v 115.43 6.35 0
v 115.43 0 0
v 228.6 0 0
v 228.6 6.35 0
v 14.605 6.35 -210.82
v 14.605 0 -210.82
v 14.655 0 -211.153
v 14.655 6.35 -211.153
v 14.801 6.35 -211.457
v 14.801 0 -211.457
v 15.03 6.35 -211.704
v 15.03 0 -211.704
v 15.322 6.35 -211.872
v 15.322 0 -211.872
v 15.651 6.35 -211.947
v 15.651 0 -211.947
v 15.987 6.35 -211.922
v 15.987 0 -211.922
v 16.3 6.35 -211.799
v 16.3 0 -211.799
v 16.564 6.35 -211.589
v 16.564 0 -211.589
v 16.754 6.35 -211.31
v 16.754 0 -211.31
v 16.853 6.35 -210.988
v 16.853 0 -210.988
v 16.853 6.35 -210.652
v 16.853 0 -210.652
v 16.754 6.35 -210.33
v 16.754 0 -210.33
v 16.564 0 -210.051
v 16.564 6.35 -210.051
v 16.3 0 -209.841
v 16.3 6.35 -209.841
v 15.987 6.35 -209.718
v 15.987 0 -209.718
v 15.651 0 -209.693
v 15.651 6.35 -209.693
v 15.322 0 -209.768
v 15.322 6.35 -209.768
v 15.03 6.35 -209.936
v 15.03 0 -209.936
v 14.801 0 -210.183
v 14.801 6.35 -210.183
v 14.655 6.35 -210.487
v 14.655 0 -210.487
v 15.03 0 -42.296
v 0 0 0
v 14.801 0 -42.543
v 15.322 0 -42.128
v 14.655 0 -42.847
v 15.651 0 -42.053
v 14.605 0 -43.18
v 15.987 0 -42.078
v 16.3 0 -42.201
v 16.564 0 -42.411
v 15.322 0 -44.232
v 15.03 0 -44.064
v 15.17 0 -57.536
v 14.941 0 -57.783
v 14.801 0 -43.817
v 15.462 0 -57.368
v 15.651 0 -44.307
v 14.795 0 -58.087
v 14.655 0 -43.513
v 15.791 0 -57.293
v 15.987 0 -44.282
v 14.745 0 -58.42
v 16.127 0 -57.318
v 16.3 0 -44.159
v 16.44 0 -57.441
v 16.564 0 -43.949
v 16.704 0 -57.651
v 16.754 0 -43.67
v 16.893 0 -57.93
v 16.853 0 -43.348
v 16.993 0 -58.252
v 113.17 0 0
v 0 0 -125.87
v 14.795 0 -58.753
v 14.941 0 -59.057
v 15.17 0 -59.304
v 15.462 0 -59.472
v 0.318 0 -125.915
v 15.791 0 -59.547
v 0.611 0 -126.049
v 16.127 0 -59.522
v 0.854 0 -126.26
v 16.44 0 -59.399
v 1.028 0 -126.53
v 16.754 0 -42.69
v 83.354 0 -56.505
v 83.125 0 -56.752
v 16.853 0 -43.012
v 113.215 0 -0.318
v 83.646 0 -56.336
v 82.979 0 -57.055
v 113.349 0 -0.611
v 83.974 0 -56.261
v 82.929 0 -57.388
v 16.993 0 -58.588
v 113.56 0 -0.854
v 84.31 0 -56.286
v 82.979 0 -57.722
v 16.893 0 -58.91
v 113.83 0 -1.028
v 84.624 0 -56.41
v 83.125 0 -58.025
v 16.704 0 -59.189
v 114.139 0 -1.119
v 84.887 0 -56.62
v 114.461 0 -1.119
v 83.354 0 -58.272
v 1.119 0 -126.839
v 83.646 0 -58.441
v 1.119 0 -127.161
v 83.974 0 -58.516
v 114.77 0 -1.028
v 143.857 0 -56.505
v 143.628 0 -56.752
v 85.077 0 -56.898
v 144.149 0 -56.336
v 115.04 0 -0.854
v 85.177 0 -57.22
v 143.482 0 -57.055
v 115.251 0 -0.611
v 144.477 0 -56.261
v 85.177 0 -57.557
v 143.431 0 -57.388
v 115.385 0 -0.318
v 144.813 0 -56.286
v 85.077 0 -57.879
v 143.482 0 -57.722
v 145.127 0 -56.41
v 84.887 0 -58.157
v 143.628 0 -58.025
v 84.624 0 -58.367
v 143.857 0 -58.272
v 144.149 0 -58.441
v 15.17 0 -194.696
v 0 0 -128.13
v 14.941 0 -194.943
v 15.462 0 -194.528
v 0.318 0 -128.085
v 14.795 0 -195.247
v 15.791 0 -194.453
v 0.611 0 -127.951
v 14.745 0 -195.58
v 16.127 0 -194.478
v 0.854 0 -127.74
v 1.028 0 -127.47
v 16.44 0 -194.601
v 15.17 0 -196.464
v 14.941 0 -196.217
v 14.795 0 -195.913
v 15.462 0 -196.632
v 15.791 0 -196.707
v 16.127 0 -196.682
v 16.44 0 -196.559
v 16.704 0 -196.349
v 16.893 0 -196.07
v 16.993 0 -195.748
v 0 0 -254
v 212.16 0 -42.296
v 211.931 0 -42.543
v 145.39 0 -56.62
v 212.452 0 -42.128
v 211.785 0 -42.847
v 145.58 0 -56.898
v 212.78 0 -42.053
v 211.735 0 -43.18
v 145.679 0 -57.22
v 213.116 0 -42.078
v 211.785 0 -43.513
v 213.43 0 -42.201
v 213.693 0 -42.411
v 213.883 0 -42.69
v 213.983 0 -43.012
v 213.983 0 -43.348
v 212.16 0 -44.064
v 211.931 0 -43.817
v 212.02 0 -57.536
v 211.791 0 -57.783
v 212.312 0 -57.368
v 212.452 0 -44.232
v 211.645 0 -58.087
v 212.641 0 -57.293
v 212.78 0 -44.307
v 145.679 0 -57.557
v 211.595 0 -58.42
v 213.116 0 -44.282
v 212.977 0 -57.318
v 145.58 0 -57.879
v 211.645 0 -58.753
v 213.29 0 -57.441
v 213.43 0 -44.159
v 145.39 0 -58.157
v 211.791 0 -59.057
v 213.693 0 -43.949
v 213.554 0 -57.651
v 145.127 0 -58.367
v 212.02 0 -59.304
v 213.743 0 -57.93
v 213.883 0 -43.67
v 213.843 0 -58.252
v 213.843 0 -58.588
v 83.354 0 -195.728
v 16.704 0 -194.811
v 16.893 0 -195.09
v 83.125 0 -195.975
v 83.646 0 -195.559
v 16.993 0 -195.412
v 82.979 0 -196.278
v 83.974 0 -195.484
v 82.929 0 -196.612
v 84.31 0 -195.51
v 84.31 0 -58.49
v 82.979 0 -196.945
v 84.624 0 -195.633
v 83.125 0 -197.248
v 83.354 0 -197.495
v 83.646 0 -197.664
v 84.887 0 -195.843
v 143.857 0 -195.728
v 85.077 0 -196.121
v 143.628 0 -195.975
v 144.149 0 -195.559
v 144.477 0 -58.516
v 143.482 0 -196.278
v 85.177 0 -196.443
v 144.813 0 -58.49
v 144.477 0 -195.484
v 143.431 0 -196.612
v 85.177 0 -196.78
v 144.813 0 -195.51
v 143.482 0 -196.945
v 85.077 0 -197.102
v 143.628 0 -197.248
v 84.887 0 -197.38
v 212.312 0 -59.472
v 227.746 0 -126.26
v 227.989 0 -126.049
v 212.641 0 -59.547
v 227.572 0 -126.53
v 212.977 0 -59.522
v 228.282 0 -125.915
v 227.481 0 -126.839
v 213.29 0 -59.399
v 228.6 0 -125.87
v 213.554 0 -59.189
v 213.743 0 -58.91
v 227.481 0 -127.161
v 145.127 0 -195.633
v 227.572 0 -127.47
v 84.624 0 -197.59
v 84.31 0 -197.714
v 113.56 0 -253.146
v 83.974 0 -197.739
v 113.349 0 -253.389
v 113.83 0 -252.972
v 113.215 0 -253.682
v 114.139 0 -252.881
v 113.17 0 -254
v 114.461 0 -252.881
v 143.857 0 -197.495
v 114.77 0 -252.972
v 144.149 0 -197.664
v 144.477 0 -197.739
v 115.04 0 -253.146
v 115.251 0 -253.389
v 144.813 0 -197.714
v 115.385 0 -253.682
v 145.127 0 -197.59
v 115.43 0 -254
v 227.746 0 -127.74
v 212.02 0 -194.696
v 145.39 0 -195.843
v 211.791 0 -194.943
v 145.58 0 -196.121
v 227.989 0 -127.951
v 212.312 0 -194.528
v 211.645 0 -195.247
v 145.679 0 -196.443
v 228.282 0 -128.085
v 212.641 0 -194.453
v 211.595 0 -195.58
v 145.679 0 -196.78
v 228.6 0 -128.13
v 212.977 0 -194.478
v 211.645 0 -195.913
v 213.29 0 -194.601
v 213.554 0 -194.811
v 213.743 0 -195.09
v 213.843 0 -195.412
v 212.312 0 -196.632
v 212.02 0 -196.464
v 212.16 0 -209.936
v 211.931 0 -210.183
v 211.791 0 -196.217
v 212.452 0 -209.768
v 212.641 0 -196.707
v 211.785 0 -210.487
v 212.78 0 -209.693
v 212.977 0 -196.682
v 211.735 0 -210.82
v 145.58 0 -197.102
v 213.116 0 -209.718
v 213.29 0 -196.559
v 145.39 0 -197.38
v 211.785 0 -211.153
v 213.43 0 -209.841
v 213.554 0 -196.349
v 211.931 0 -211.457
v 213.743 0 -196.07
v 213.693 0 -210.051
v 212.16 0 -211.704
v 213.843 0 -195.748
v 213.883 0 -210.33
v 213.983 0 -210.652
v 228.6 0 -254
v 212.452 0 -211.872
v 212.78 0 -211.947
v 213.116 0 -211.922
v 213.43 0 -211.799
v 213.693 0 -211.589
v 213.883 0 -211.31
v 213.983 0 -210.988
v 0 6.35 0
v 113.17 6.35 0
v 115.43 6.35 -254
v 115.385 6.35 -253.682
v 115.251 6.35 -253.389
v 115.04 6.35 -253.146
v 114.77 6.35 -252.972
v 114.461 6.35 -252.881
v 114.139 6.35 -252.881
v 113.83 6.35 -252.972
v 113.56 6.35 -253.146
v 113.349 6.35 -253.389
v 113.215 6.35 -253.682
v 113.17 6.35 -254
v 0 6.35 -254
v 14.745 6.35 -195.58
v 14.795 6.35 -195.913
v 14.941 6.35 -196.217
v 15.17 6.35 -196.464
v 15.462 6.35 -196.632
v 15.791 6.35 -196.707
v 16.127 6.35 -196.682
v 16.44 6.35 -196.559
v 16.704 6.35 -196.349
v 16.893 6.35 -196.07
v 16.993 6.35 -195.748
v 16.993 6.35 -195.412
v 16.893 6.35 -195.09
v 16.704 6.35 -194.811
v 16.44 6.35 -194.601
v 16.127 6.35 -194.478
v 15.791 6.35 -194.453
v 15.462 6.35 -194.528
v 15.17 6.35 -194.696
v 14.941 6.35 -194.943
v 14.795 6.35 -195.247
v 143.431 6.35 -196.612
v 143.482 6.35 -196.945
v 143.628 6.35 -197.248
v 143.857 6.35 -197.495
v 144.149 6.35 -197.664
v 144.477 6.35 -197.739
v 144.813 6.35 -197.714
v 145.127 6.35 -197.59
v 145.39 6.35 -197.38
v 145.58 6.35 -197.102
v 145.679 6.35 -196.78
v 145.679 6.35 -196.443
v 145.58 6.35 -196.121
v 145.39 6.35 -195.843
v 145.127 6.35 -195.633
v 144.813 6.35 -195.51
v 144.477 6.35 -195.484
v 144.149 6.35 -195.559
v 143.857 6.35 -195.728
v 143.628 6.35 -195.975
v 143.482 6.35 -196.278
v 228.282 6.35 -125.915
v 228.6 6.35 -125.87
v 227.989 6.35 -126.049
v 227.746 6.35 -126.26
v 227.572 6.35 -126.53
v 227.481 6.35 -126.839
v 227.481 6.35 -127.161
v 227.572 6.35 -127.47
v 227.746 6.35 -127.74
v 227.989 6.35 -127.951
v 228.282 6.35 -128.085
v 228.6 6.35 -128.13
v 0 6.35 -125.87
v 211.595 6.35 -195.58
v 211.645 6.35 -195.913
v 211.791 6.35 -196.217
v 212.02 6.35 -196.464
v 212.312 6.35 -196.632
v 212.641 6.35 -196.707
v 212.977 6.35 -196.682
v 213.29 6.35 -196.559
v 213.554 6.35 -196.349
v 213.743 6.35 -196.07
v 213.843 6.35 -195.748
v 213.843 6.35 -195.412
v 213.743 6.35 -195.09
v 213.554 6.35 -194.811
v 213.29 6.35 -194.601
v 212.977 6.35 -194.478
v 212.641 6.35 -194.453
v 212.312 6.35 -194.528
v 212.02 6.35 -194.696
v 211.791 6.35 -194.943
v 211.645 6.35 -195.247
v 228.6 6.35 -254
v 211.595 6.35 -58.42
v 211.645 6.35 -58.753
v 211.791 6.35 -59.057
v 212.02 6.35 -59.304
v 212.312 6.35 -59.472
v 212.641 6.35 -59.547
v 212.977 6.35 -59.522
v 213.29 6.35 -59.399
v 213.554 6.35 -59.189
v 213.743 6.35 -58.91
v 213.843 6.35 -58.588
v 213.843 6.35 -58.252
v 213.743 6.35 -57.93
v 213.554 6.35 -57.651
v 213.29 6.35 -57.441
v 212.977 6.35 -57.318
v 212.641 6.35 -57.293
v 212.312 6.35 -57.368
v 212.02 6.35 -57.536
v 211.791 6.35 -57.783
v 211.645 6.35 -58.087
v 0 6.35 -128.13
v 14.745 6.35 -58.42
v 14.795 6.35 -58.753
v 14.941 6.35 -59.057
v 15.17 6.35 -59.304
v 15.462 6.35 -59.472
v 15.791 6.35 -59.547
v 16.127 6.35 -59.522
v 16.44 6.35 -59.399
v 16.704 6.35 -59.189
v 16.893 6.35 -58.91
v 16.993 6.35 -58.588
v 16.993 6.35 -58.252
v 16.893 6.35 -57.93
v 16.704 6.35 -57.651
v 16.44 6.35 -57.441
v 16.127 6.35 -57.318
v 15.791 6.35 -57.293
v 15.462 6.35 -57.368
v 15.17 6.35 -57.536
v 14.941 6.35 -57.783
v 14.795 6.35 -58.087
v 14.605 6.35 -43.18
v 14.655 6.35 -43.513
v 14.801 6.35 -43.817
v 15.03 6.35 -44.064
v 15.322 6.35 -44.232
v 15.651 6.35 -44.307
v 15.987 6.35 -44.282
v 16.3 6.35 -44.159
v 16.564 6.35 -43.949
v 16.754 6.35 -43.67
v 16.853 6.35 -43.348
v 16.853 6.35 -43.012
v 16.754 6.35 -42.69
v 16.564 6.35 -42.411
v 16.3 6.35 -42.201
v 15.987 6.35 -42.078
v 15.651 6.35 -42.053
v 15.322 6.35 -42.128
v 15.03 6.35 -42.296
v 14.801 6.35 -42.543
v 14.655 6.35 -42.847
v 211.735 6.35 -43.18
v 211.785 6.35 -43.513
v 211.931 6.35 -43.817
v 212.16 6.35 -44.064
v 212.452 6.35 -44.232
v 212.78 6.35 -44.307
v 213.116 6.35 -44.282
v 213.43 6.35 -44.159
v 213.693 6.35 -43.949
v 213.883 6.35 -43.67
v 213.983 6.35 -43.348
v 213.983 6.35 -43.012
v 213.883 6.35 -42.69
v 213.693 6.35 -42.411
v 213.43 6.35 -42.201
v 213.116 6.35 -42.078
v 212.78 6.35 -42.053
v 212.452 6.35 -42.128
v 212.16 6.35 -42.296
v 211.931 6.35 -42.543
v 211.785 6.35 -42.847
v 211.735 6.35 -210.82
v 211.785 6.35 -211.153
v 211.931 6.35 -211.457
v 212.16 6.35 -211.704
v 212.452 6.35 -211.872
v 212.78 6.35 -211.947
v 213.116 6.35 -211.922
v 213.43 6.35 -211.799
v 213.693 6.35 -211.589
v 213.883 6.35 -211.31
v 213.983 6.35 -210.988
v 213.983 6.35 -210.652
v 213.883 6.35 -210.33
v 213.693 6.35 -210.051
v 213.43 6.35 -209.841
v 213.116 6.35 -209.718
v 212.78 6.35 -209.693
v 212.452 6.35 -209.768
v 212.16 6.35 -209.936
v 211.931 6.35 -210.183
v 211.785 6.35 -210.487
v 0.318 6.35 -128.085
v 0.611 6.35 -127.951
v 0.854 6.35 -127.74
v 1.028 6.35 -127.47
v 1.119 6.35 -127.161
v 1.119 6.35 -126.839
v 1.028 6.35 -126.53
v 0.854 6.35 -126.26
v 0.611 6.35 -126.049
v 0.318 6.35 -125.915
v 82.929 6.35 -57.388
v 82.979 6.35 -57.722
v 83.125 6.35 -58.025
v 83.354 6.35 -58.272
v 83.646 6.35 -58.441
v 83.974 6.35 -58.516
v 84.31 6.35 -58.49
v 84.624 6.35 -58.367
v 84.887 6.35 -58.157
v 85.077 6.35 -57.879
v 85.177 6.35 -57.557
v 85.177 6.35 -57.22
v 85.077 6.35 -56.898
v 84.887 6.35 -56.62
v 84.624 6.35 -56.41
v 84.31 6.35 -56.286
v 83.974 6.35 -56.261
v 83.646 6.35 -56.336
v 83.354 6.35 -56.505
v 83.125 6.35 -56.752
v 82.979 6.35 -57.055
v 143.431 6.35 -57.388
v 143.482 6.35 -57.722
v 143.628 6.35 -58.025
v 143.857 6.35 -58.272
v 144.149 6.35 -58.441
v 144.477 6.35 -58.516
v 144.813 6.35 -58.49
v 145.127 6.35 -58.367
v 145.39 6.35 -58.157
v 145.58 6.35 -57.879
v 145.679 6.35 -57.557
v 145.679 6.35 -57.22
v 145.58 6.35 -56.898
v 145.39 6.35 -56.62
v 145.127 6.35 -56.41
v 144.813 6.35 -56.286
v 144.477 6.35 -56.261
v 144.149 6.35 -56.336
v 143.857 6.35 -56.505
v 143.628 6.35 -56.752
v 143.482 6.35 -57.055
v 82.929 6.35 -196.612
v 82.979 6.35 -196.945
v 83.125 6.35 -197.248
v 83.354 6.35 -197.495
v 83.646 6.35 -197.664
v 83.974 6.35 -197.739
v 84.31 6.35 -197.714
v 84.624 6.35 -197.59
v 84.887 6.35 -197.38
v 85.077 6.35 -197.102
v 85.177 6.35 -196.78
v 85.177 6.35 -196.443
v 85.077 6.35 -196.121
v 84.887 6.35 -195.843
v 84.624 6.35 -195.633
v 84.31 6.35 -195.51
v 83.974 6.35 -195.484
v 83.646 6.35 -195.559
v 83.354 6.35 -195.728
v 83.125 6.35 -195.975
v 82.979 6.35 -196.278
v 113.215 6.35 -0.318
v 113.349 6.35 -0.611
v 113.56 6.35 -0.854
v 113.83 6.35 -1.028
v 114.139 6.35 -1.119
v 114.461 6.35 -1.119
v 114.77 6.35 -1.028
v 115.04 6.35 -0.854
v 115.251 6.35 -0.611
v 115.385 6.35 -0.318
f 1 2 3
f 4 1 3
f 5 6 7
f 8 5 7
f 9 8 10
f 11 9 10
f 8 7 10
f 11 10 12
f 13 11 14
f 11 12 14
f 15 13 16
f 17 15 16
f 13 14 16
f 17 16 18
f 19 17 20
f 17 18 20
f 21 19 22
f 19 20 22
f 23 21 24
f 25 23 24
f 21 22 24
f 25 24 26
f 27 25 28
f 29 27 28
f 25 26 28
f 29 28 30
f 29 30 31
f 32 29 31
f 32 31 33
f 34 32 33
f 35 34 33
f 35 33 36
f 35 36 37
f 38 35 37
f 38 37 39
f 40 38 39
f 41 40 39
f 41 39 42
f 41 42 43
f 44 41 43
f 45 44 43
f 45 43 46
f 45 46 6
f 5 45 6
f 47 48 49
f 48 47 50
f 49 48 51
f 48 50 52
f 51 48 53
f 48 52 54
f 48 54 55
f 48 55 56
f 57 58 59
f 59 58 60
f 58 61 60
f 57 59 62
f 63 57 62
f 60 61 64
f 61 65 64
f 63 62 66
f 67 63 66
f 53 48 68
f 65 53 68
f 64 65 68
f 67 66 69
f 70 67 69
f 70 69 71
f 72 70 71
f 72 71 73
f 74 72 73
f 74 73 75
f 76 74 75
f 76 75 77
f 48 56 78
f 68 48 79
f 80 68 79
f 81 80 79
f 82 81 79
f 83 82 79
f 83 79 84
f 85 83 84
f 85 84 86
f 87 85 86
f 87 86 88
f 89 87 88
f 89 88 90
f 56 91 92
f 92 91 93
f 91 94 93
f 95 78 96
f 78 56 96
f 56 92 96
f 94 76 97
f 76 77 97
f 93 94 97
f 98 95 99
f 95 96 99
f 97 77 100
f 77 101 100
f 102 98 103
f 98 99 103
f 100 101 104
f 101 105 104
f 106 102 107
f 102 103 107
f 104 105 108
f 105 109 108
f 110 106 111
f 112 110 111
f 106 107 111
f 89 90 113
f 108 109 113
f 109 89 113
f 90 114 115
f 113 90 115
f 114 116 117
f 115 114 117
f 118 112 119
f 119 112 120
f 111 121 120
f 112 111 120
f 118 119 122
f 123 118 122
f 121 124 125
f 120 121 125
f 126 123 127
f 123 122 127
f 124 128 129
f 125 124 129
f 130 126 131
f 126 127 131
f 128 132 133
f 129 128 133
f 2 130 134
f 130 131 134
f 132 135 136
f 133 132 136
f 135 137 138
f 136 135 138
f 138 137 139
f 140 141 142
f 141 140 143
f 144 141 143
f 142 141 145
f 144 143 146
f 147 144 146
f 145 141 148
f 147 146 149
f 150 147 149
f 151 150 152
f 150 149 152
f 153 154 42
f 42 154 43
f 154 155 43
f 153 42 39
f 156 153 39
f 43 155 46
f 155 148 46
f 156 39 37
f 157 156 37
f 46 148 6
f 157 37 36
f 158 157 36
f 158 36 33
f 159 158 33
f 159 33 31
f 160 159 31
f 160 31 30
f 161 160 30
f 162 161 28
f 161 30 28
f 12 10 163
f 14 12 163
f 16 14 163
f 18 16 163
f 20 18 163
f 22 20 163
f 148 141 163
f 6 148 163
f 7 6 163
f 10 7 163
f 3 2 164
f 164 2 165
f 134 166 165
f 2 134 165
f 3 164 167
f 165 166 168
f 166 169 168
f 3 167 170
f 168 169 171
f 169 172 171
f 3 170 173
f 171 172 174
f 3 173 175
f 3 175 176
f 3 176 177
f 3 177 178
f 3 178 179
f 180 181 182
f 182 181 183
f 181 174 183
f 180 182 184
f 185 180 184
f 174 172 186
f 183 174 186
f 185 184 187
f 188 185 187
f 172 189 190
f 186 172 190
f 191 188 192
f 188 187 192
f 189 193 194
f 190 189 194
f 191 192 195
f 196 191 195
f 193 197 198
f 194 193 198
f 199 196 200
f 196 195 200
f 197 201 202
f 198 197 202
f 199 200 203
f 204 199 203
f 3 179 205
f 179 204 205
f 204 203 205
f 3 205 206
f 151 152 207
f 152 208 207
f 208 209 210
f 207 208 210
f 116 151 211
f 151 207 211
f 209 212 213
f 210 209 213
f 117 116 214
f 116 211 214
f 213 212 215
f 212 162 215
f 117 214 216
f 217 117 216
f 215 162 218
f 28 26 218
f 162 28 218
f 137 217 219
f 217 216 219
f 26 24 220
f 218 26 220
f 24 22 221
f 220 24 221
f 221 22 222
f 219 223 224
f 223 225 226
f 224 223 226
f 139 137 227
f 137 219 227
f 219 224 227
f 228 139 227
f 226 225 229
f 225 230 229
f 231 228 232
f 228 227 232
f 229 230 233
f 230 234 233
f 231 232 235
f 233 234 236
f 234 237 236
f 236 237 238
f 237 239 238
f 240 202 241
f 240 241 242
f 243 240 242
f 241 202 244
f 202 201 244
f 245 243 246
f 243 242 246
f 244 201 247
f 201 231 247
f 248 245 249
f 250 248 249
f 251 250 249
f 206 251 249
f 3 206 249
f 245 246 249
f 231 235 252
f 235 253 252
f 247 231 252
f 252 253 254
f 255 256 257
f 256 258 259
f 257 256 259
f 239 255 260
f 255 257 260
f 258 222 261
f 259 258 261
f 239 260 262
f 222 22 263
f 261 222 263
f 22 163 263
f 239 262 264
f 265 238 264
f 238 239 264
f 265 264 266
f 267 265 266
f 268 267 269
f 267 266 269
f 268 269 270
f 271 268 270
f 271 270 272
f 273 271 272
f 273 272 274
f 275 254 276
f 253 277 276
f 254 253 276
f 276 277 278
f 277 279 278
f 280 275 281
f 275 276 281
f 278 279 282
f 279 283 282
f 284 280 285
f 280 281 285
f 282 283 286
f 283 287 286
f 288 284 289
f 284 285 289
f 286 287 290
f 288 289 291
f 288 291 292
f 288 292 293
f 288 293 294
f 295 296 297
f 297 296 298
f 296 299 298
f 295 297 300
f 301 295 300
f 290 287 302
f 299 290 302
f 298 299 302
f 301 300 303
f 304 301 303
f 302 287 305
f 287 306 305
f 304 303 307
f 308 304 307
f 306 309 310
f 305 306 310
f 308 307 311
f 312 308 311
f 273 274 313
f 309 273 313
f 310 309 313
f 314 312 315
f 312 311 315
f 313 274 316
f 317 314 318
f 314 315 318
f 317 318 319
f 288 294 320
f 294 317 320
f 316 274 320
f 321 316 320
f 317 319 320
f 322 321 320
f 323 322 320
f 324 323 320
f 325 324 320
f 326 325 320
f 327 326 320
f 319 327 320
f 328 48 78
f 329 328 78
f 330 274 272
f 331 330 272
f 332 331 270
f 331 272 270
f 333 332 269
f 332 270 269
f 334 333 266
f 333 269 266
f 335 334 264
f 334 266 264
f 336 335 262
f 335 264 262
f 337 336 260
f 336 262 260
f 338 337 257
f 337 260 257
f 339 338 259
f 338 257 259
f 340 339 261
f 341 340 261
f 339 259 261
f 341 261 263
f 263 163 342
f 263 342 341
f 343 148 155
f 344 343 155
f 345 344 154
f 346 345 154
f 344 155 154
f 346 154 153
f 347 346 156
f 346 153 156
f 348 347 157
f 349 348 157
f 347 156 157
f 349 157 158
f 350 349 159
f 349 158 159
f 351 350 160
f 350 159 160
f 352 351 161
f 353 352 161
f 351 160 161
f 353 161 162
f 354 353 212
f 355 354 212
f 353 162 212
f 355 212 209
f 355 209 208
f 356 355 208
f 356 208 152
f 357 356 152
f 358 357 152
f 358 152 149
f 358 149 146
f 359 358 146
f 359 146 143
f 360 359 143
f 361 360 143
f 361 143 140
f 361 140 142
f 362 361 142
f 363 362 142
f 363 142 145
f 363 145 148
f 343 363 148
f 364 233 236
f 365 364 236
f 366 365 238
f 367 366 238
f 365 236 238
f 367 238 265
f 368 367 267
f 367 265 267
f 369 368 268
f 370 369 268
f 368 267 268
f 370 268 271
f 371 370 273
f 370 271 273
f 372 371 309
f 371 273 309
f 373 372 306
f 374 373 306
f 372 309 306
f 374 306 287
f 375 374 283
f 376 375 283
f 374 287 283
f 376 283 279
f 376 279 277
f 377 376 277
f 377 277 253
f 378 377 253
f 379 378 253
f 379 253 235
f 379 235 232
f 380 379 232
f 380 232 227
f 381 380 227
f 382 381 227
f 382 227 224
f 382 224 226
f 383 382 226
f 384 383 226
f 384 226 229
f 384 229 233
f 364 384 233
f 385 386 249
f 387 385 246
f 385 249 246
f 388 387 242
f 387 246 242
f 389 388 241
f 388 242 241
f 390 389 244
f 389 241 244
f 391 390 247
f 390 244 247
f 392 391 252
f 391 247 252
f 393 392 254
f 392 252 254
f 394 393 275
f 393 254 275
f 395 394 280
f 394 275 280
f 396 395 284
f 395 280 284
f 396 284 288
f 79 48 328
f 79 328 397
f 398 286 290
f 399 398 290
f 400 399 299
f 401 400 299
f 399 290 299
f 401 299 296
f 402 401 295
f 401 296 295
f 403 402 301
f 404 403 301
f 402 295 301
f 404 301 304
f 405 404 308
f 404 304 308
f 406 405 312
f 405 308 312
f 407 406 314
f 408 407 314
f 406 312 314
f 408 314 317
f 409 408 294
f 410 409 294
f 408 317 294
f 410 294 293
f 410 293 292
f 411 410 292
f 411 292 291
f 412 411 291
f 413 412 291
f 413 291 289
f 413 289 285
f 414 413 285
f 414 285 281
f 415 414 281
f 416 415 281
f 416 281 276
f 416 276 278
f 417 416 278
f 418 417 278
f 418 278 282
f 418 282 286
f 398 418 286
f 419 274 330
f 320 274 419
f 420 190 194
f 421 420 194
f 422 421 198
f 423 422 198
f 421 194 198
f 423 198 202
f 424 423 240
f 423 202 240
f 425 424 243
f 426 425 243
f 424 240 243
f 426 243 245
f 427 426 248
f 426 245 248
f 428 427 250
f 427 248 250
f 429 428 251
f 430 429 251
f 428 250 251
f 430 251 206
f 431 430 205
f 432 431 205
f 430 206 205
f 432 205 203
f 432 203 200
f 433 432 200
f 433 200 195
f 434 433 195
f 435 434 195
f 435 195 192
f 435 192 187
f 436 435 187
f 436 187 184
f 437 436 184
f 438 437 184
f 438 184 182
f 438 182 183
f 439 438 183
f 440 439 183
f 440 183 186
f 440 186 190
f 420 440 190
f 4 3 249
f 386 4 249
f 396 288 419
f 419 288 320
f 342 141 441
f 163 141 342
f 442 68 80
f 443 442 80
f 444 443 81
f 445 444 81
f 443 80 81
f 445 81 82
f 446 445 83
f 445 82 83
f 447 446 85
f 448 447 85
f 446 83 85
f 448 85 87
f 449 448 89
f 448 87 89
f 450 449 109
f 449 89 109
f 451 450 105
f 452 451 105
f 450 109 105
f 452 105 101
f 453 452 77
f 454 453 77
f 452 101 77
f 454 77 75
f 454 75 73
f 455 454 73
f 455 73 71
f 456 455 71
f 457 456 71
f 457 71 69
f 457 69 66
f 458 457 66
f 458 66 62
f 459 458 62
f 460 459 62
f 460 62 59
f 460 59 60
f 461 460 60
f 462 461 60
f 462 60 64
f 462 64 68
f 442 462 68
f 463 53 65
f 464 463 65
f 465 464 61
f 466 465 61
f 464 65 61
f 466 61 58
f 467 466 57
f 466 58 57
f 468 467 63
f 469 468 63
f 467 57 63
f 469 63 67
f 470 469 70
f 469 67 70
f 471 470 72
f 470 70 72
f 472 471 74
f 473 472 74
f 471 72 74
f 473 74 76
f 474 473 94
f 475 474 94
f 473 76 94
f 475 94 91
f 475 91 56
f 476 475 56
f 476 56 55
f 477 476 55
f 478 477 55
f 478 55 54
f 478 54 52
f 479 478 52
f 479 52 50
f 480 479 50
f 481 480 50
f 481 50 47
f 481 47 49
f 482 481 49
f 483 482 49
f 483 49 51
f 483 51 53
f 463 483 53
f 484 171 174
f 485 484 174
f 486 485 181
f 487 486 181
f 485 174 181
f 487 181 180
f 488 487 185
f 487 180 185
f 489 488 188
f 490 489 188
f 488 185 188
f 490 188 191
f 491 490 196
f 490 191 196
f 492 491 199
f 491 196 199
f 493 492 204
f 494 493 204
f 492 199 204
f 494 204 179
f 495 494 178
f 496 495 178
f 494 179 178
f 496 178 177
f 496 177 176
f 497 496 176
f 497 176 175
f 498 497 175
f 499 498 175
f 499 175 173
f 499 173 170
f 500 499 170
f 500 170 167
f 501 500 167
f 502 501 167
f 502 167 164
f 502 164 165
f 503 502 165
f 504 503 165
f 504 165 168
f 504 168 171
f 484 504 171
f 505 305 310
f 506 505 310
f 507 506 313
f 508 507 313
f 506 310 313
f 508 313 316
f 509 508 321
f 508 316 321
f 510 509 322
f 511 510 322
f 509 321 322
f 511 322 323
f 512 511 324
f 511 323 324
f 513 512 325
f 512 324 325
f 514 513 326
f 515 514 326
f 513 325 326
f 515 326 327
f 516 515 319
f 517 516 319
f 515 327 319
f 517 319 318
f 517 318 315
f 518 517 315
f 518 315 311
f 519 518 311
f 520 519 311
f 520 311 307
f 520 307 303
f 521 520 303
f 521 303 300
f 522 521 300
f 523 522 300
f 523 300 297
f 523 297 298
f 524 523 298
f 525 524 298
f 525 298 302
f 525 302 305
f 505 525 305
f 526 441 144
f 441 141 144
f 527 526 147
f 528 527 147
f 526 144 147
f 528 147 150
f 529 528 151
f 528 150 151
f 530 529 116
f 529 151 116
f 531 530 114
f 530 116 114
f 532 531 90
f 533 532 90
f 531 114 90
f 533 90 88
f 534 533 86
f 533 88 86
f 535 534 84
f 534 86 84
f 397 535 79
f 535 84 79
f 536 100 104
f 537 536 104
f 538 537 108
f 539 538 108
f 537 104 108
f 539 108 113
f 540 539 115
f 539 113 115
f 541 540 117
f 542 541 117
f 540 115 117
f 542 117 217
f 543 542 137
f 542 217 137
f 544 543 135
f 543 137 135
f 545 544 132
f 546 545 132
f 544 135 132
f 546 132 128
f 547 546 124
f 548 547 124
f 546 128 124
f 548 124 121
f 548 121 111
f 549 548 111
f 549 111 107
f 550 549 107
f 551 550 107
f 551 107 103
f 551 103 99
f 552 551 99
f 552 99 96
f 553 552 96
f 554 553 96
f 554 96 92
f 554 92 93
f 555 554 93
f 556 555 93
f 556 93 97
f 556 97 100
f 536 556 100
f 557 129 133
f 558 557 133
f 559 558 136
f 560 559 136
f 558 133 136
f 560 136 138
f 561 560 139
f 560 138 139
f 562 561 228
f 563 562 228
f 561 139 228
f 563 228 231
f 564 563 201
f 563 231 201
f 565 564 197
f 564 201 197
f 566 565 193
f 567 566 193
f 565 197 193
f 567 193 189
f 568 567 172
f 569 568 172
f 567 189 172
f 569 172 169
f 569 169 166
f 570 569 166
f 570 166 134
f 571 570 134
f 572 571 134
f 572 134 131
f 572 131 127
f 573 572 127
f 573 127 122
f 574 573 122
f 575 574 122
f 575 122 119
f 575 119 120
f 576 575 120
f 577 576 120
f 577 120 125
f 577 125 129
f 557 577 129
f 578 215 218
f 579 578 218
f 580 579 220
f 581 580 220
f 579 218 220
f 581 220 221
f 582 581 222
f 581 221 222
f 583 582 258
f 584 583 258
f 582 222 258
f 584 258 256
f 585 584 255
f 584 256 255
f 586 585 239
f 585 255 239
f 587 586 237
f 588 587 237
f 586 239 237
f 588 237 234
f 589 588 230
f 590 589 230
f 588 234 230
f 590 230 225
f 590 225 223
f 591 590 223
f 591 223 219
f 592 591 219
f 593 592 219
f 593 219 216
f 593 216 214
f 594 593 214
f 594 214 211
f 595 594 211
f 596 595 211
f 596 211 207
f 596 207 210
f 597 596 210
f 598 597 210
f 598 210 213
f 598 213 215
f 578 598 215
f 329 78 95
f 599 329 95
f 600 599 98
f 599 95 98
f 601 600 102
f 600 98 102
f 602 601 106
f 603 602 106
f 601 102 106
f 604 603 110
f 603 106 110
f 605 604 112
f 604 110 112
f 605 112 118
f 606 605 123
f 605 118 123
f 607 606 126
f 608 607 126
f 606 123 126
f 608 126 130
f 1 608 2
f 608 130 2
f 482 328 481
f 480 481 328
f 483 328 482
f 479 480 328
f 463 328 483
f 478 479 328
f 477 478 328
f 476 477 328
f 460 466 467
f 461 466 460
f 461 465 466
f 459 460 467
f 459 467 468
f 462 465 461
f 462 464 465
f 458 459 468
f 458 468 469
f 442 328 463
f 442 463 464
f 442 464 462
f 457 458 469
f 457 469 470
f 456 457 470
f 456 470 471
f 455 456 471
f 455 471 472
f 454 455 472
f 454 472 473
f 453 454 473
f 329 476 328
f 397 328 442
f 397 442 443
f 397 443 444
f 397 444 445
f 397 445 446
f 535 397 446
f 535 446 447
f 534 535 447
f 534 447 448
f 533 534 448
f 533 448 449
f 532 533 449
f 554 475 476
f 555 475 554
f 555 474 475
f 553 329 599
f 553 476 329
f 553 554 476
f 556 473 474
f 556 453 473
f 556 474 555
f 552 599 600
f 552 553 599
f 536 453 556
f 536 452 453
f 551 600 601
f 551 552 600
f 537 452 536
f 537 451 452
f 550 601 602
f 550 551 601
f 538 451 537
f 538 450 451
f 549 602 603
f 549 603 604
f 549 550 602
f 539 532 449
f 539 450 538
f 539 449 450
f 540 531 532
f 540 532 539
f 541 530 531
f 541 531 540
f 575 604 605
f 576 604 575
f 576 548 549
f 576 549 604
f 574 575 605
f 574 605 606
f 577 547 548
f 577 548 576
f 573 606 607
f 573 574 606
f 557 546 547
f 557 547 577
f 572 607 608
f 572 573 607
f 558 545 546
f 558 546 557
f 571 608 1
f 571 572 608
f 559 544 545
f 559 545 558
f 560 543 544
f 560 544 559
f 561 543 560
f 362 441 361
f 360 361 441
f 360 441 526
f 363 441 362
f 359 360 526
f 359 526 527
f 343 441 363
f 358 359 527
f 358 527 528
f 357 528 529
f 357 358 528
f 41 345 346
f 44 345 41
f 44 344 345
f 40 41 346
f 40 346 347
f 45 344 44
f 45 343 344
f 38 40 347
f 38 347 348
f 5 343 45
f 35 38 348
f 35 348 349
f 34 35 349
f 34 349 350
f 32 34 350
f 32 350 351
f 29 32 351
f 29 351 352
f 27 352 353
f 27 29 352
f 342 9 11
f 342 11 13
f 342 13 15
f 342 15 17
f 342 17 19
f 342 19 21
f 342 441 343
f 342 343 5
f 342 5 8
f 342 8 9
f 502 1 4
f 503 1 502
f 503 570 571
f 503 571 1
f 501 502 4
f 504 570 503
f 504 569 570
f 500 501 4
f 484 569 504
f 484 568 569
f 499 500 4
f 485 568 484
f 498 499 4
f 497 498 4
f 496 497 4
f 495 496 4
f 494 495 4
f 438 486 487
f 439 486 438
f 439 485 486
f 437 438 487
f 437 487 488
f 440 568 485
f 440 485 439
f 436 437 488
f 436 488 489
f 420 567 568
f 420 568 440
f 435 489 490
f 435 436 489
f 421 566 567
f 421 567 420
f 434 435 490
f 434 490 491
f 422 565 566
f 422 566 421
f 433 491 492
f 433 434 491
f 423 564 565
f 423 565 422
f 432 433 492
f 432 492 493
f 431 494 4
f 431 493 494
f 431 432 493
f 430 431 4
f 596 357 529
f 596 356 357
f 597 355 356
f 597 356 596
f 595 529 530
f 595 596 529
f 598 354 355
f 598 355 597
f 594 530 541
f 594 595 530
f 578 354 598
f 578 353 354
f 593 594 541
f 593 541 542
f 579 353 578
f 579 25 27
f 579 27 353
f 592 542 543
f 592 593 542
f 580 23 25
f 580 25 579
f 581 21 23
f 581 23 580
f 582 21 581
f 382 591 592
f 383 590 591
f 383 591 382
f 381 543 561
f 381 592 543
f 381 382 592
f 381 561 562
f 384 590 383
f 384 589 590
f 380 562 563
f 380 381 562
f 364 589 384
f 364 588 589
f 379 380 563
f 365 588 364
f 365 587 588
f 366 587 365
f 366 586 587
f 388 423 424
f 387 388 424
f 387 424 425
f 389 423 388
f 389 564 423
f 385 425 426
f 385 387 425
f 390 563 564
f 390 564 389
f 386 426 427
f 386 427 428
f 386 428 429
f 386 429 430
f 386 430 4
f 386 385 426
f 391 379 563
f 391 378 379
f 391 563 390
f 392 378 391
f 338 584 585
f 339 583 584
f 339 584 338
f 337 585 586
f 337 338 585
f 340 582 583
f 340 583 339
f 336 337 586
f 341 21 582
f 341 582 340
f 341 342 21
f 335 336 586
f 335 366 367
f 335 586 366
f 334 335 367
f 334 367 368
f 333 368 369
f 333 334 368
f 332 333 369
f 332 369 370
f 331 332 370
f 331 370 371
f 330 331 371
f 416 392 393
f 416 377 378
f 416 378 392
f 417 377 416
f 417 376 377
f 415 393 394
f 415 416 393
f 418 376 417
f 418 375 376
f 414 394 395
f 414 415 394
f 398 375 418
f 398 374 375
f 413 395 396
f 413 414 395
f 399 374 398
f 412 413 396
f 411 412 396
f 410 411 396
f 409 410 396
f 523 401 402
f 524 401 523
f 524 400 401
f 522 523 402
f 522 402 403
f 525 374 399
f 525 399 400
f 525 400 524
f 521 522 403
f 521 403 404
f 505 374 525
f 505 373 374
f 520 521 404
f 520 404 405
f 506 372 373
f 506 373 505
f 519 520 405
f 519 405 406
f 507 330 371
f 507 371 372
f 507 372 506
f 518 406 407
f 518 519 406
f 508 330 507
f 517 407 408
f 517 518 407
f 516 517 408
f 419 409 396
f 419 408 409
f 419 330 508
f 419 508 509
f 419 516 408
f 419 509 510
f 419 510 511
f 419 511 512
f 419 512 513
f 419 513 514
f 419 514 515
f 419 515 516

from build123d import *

# Parameters (mm, degrees)
SKETCH1_W             = 228.6
SKETCH1_H             = 254
BOSS_EXTRUDE1_DEPTH   = 6.35
F_4_40_TAPPED_HOLE1_D = 2.2606


with BuildPart() as part:
    # Sketch1 → Boss-Extrude1 (new body)
    with BuildSketch(Plane(origin=(0, 0, 0), x_dir=(1, 0, 0), z_dir=(0, 1, 0))):
        with Locations((114.3, 127)):
            Rectangle(SKETCH1_W, SKETCH1_H)
    extrude(amount=BOSS_EXTRUDE1_DEPTH)

    # #4-40 Tapped Hole1 (through all)
    with Locations(Plane(origin=(0, 6.35, 0), x_dir=(1, 0, 0), z_dir=(0, 1, 0))):
        with Locations((15.735159407, 43.18), (15.875, 58.42), (84.05884141, 57.388437181), (144.561688198, 57.388437181), (0, 127), (144.561688198, 196.611562819), (84.05884141, 196.611562819), (15.875, 195.58), (15.735159407, 210.82), (114.3, 0), (212.864840593, 43.18), (212.725, 58.42), (212.864840593, 210.82), (212.725, 195.58), (228.6, 127), (114.3, 254)):
            Hole(F_4_40_TAPPED_HOLE1_D / 2)


solid = part.part
